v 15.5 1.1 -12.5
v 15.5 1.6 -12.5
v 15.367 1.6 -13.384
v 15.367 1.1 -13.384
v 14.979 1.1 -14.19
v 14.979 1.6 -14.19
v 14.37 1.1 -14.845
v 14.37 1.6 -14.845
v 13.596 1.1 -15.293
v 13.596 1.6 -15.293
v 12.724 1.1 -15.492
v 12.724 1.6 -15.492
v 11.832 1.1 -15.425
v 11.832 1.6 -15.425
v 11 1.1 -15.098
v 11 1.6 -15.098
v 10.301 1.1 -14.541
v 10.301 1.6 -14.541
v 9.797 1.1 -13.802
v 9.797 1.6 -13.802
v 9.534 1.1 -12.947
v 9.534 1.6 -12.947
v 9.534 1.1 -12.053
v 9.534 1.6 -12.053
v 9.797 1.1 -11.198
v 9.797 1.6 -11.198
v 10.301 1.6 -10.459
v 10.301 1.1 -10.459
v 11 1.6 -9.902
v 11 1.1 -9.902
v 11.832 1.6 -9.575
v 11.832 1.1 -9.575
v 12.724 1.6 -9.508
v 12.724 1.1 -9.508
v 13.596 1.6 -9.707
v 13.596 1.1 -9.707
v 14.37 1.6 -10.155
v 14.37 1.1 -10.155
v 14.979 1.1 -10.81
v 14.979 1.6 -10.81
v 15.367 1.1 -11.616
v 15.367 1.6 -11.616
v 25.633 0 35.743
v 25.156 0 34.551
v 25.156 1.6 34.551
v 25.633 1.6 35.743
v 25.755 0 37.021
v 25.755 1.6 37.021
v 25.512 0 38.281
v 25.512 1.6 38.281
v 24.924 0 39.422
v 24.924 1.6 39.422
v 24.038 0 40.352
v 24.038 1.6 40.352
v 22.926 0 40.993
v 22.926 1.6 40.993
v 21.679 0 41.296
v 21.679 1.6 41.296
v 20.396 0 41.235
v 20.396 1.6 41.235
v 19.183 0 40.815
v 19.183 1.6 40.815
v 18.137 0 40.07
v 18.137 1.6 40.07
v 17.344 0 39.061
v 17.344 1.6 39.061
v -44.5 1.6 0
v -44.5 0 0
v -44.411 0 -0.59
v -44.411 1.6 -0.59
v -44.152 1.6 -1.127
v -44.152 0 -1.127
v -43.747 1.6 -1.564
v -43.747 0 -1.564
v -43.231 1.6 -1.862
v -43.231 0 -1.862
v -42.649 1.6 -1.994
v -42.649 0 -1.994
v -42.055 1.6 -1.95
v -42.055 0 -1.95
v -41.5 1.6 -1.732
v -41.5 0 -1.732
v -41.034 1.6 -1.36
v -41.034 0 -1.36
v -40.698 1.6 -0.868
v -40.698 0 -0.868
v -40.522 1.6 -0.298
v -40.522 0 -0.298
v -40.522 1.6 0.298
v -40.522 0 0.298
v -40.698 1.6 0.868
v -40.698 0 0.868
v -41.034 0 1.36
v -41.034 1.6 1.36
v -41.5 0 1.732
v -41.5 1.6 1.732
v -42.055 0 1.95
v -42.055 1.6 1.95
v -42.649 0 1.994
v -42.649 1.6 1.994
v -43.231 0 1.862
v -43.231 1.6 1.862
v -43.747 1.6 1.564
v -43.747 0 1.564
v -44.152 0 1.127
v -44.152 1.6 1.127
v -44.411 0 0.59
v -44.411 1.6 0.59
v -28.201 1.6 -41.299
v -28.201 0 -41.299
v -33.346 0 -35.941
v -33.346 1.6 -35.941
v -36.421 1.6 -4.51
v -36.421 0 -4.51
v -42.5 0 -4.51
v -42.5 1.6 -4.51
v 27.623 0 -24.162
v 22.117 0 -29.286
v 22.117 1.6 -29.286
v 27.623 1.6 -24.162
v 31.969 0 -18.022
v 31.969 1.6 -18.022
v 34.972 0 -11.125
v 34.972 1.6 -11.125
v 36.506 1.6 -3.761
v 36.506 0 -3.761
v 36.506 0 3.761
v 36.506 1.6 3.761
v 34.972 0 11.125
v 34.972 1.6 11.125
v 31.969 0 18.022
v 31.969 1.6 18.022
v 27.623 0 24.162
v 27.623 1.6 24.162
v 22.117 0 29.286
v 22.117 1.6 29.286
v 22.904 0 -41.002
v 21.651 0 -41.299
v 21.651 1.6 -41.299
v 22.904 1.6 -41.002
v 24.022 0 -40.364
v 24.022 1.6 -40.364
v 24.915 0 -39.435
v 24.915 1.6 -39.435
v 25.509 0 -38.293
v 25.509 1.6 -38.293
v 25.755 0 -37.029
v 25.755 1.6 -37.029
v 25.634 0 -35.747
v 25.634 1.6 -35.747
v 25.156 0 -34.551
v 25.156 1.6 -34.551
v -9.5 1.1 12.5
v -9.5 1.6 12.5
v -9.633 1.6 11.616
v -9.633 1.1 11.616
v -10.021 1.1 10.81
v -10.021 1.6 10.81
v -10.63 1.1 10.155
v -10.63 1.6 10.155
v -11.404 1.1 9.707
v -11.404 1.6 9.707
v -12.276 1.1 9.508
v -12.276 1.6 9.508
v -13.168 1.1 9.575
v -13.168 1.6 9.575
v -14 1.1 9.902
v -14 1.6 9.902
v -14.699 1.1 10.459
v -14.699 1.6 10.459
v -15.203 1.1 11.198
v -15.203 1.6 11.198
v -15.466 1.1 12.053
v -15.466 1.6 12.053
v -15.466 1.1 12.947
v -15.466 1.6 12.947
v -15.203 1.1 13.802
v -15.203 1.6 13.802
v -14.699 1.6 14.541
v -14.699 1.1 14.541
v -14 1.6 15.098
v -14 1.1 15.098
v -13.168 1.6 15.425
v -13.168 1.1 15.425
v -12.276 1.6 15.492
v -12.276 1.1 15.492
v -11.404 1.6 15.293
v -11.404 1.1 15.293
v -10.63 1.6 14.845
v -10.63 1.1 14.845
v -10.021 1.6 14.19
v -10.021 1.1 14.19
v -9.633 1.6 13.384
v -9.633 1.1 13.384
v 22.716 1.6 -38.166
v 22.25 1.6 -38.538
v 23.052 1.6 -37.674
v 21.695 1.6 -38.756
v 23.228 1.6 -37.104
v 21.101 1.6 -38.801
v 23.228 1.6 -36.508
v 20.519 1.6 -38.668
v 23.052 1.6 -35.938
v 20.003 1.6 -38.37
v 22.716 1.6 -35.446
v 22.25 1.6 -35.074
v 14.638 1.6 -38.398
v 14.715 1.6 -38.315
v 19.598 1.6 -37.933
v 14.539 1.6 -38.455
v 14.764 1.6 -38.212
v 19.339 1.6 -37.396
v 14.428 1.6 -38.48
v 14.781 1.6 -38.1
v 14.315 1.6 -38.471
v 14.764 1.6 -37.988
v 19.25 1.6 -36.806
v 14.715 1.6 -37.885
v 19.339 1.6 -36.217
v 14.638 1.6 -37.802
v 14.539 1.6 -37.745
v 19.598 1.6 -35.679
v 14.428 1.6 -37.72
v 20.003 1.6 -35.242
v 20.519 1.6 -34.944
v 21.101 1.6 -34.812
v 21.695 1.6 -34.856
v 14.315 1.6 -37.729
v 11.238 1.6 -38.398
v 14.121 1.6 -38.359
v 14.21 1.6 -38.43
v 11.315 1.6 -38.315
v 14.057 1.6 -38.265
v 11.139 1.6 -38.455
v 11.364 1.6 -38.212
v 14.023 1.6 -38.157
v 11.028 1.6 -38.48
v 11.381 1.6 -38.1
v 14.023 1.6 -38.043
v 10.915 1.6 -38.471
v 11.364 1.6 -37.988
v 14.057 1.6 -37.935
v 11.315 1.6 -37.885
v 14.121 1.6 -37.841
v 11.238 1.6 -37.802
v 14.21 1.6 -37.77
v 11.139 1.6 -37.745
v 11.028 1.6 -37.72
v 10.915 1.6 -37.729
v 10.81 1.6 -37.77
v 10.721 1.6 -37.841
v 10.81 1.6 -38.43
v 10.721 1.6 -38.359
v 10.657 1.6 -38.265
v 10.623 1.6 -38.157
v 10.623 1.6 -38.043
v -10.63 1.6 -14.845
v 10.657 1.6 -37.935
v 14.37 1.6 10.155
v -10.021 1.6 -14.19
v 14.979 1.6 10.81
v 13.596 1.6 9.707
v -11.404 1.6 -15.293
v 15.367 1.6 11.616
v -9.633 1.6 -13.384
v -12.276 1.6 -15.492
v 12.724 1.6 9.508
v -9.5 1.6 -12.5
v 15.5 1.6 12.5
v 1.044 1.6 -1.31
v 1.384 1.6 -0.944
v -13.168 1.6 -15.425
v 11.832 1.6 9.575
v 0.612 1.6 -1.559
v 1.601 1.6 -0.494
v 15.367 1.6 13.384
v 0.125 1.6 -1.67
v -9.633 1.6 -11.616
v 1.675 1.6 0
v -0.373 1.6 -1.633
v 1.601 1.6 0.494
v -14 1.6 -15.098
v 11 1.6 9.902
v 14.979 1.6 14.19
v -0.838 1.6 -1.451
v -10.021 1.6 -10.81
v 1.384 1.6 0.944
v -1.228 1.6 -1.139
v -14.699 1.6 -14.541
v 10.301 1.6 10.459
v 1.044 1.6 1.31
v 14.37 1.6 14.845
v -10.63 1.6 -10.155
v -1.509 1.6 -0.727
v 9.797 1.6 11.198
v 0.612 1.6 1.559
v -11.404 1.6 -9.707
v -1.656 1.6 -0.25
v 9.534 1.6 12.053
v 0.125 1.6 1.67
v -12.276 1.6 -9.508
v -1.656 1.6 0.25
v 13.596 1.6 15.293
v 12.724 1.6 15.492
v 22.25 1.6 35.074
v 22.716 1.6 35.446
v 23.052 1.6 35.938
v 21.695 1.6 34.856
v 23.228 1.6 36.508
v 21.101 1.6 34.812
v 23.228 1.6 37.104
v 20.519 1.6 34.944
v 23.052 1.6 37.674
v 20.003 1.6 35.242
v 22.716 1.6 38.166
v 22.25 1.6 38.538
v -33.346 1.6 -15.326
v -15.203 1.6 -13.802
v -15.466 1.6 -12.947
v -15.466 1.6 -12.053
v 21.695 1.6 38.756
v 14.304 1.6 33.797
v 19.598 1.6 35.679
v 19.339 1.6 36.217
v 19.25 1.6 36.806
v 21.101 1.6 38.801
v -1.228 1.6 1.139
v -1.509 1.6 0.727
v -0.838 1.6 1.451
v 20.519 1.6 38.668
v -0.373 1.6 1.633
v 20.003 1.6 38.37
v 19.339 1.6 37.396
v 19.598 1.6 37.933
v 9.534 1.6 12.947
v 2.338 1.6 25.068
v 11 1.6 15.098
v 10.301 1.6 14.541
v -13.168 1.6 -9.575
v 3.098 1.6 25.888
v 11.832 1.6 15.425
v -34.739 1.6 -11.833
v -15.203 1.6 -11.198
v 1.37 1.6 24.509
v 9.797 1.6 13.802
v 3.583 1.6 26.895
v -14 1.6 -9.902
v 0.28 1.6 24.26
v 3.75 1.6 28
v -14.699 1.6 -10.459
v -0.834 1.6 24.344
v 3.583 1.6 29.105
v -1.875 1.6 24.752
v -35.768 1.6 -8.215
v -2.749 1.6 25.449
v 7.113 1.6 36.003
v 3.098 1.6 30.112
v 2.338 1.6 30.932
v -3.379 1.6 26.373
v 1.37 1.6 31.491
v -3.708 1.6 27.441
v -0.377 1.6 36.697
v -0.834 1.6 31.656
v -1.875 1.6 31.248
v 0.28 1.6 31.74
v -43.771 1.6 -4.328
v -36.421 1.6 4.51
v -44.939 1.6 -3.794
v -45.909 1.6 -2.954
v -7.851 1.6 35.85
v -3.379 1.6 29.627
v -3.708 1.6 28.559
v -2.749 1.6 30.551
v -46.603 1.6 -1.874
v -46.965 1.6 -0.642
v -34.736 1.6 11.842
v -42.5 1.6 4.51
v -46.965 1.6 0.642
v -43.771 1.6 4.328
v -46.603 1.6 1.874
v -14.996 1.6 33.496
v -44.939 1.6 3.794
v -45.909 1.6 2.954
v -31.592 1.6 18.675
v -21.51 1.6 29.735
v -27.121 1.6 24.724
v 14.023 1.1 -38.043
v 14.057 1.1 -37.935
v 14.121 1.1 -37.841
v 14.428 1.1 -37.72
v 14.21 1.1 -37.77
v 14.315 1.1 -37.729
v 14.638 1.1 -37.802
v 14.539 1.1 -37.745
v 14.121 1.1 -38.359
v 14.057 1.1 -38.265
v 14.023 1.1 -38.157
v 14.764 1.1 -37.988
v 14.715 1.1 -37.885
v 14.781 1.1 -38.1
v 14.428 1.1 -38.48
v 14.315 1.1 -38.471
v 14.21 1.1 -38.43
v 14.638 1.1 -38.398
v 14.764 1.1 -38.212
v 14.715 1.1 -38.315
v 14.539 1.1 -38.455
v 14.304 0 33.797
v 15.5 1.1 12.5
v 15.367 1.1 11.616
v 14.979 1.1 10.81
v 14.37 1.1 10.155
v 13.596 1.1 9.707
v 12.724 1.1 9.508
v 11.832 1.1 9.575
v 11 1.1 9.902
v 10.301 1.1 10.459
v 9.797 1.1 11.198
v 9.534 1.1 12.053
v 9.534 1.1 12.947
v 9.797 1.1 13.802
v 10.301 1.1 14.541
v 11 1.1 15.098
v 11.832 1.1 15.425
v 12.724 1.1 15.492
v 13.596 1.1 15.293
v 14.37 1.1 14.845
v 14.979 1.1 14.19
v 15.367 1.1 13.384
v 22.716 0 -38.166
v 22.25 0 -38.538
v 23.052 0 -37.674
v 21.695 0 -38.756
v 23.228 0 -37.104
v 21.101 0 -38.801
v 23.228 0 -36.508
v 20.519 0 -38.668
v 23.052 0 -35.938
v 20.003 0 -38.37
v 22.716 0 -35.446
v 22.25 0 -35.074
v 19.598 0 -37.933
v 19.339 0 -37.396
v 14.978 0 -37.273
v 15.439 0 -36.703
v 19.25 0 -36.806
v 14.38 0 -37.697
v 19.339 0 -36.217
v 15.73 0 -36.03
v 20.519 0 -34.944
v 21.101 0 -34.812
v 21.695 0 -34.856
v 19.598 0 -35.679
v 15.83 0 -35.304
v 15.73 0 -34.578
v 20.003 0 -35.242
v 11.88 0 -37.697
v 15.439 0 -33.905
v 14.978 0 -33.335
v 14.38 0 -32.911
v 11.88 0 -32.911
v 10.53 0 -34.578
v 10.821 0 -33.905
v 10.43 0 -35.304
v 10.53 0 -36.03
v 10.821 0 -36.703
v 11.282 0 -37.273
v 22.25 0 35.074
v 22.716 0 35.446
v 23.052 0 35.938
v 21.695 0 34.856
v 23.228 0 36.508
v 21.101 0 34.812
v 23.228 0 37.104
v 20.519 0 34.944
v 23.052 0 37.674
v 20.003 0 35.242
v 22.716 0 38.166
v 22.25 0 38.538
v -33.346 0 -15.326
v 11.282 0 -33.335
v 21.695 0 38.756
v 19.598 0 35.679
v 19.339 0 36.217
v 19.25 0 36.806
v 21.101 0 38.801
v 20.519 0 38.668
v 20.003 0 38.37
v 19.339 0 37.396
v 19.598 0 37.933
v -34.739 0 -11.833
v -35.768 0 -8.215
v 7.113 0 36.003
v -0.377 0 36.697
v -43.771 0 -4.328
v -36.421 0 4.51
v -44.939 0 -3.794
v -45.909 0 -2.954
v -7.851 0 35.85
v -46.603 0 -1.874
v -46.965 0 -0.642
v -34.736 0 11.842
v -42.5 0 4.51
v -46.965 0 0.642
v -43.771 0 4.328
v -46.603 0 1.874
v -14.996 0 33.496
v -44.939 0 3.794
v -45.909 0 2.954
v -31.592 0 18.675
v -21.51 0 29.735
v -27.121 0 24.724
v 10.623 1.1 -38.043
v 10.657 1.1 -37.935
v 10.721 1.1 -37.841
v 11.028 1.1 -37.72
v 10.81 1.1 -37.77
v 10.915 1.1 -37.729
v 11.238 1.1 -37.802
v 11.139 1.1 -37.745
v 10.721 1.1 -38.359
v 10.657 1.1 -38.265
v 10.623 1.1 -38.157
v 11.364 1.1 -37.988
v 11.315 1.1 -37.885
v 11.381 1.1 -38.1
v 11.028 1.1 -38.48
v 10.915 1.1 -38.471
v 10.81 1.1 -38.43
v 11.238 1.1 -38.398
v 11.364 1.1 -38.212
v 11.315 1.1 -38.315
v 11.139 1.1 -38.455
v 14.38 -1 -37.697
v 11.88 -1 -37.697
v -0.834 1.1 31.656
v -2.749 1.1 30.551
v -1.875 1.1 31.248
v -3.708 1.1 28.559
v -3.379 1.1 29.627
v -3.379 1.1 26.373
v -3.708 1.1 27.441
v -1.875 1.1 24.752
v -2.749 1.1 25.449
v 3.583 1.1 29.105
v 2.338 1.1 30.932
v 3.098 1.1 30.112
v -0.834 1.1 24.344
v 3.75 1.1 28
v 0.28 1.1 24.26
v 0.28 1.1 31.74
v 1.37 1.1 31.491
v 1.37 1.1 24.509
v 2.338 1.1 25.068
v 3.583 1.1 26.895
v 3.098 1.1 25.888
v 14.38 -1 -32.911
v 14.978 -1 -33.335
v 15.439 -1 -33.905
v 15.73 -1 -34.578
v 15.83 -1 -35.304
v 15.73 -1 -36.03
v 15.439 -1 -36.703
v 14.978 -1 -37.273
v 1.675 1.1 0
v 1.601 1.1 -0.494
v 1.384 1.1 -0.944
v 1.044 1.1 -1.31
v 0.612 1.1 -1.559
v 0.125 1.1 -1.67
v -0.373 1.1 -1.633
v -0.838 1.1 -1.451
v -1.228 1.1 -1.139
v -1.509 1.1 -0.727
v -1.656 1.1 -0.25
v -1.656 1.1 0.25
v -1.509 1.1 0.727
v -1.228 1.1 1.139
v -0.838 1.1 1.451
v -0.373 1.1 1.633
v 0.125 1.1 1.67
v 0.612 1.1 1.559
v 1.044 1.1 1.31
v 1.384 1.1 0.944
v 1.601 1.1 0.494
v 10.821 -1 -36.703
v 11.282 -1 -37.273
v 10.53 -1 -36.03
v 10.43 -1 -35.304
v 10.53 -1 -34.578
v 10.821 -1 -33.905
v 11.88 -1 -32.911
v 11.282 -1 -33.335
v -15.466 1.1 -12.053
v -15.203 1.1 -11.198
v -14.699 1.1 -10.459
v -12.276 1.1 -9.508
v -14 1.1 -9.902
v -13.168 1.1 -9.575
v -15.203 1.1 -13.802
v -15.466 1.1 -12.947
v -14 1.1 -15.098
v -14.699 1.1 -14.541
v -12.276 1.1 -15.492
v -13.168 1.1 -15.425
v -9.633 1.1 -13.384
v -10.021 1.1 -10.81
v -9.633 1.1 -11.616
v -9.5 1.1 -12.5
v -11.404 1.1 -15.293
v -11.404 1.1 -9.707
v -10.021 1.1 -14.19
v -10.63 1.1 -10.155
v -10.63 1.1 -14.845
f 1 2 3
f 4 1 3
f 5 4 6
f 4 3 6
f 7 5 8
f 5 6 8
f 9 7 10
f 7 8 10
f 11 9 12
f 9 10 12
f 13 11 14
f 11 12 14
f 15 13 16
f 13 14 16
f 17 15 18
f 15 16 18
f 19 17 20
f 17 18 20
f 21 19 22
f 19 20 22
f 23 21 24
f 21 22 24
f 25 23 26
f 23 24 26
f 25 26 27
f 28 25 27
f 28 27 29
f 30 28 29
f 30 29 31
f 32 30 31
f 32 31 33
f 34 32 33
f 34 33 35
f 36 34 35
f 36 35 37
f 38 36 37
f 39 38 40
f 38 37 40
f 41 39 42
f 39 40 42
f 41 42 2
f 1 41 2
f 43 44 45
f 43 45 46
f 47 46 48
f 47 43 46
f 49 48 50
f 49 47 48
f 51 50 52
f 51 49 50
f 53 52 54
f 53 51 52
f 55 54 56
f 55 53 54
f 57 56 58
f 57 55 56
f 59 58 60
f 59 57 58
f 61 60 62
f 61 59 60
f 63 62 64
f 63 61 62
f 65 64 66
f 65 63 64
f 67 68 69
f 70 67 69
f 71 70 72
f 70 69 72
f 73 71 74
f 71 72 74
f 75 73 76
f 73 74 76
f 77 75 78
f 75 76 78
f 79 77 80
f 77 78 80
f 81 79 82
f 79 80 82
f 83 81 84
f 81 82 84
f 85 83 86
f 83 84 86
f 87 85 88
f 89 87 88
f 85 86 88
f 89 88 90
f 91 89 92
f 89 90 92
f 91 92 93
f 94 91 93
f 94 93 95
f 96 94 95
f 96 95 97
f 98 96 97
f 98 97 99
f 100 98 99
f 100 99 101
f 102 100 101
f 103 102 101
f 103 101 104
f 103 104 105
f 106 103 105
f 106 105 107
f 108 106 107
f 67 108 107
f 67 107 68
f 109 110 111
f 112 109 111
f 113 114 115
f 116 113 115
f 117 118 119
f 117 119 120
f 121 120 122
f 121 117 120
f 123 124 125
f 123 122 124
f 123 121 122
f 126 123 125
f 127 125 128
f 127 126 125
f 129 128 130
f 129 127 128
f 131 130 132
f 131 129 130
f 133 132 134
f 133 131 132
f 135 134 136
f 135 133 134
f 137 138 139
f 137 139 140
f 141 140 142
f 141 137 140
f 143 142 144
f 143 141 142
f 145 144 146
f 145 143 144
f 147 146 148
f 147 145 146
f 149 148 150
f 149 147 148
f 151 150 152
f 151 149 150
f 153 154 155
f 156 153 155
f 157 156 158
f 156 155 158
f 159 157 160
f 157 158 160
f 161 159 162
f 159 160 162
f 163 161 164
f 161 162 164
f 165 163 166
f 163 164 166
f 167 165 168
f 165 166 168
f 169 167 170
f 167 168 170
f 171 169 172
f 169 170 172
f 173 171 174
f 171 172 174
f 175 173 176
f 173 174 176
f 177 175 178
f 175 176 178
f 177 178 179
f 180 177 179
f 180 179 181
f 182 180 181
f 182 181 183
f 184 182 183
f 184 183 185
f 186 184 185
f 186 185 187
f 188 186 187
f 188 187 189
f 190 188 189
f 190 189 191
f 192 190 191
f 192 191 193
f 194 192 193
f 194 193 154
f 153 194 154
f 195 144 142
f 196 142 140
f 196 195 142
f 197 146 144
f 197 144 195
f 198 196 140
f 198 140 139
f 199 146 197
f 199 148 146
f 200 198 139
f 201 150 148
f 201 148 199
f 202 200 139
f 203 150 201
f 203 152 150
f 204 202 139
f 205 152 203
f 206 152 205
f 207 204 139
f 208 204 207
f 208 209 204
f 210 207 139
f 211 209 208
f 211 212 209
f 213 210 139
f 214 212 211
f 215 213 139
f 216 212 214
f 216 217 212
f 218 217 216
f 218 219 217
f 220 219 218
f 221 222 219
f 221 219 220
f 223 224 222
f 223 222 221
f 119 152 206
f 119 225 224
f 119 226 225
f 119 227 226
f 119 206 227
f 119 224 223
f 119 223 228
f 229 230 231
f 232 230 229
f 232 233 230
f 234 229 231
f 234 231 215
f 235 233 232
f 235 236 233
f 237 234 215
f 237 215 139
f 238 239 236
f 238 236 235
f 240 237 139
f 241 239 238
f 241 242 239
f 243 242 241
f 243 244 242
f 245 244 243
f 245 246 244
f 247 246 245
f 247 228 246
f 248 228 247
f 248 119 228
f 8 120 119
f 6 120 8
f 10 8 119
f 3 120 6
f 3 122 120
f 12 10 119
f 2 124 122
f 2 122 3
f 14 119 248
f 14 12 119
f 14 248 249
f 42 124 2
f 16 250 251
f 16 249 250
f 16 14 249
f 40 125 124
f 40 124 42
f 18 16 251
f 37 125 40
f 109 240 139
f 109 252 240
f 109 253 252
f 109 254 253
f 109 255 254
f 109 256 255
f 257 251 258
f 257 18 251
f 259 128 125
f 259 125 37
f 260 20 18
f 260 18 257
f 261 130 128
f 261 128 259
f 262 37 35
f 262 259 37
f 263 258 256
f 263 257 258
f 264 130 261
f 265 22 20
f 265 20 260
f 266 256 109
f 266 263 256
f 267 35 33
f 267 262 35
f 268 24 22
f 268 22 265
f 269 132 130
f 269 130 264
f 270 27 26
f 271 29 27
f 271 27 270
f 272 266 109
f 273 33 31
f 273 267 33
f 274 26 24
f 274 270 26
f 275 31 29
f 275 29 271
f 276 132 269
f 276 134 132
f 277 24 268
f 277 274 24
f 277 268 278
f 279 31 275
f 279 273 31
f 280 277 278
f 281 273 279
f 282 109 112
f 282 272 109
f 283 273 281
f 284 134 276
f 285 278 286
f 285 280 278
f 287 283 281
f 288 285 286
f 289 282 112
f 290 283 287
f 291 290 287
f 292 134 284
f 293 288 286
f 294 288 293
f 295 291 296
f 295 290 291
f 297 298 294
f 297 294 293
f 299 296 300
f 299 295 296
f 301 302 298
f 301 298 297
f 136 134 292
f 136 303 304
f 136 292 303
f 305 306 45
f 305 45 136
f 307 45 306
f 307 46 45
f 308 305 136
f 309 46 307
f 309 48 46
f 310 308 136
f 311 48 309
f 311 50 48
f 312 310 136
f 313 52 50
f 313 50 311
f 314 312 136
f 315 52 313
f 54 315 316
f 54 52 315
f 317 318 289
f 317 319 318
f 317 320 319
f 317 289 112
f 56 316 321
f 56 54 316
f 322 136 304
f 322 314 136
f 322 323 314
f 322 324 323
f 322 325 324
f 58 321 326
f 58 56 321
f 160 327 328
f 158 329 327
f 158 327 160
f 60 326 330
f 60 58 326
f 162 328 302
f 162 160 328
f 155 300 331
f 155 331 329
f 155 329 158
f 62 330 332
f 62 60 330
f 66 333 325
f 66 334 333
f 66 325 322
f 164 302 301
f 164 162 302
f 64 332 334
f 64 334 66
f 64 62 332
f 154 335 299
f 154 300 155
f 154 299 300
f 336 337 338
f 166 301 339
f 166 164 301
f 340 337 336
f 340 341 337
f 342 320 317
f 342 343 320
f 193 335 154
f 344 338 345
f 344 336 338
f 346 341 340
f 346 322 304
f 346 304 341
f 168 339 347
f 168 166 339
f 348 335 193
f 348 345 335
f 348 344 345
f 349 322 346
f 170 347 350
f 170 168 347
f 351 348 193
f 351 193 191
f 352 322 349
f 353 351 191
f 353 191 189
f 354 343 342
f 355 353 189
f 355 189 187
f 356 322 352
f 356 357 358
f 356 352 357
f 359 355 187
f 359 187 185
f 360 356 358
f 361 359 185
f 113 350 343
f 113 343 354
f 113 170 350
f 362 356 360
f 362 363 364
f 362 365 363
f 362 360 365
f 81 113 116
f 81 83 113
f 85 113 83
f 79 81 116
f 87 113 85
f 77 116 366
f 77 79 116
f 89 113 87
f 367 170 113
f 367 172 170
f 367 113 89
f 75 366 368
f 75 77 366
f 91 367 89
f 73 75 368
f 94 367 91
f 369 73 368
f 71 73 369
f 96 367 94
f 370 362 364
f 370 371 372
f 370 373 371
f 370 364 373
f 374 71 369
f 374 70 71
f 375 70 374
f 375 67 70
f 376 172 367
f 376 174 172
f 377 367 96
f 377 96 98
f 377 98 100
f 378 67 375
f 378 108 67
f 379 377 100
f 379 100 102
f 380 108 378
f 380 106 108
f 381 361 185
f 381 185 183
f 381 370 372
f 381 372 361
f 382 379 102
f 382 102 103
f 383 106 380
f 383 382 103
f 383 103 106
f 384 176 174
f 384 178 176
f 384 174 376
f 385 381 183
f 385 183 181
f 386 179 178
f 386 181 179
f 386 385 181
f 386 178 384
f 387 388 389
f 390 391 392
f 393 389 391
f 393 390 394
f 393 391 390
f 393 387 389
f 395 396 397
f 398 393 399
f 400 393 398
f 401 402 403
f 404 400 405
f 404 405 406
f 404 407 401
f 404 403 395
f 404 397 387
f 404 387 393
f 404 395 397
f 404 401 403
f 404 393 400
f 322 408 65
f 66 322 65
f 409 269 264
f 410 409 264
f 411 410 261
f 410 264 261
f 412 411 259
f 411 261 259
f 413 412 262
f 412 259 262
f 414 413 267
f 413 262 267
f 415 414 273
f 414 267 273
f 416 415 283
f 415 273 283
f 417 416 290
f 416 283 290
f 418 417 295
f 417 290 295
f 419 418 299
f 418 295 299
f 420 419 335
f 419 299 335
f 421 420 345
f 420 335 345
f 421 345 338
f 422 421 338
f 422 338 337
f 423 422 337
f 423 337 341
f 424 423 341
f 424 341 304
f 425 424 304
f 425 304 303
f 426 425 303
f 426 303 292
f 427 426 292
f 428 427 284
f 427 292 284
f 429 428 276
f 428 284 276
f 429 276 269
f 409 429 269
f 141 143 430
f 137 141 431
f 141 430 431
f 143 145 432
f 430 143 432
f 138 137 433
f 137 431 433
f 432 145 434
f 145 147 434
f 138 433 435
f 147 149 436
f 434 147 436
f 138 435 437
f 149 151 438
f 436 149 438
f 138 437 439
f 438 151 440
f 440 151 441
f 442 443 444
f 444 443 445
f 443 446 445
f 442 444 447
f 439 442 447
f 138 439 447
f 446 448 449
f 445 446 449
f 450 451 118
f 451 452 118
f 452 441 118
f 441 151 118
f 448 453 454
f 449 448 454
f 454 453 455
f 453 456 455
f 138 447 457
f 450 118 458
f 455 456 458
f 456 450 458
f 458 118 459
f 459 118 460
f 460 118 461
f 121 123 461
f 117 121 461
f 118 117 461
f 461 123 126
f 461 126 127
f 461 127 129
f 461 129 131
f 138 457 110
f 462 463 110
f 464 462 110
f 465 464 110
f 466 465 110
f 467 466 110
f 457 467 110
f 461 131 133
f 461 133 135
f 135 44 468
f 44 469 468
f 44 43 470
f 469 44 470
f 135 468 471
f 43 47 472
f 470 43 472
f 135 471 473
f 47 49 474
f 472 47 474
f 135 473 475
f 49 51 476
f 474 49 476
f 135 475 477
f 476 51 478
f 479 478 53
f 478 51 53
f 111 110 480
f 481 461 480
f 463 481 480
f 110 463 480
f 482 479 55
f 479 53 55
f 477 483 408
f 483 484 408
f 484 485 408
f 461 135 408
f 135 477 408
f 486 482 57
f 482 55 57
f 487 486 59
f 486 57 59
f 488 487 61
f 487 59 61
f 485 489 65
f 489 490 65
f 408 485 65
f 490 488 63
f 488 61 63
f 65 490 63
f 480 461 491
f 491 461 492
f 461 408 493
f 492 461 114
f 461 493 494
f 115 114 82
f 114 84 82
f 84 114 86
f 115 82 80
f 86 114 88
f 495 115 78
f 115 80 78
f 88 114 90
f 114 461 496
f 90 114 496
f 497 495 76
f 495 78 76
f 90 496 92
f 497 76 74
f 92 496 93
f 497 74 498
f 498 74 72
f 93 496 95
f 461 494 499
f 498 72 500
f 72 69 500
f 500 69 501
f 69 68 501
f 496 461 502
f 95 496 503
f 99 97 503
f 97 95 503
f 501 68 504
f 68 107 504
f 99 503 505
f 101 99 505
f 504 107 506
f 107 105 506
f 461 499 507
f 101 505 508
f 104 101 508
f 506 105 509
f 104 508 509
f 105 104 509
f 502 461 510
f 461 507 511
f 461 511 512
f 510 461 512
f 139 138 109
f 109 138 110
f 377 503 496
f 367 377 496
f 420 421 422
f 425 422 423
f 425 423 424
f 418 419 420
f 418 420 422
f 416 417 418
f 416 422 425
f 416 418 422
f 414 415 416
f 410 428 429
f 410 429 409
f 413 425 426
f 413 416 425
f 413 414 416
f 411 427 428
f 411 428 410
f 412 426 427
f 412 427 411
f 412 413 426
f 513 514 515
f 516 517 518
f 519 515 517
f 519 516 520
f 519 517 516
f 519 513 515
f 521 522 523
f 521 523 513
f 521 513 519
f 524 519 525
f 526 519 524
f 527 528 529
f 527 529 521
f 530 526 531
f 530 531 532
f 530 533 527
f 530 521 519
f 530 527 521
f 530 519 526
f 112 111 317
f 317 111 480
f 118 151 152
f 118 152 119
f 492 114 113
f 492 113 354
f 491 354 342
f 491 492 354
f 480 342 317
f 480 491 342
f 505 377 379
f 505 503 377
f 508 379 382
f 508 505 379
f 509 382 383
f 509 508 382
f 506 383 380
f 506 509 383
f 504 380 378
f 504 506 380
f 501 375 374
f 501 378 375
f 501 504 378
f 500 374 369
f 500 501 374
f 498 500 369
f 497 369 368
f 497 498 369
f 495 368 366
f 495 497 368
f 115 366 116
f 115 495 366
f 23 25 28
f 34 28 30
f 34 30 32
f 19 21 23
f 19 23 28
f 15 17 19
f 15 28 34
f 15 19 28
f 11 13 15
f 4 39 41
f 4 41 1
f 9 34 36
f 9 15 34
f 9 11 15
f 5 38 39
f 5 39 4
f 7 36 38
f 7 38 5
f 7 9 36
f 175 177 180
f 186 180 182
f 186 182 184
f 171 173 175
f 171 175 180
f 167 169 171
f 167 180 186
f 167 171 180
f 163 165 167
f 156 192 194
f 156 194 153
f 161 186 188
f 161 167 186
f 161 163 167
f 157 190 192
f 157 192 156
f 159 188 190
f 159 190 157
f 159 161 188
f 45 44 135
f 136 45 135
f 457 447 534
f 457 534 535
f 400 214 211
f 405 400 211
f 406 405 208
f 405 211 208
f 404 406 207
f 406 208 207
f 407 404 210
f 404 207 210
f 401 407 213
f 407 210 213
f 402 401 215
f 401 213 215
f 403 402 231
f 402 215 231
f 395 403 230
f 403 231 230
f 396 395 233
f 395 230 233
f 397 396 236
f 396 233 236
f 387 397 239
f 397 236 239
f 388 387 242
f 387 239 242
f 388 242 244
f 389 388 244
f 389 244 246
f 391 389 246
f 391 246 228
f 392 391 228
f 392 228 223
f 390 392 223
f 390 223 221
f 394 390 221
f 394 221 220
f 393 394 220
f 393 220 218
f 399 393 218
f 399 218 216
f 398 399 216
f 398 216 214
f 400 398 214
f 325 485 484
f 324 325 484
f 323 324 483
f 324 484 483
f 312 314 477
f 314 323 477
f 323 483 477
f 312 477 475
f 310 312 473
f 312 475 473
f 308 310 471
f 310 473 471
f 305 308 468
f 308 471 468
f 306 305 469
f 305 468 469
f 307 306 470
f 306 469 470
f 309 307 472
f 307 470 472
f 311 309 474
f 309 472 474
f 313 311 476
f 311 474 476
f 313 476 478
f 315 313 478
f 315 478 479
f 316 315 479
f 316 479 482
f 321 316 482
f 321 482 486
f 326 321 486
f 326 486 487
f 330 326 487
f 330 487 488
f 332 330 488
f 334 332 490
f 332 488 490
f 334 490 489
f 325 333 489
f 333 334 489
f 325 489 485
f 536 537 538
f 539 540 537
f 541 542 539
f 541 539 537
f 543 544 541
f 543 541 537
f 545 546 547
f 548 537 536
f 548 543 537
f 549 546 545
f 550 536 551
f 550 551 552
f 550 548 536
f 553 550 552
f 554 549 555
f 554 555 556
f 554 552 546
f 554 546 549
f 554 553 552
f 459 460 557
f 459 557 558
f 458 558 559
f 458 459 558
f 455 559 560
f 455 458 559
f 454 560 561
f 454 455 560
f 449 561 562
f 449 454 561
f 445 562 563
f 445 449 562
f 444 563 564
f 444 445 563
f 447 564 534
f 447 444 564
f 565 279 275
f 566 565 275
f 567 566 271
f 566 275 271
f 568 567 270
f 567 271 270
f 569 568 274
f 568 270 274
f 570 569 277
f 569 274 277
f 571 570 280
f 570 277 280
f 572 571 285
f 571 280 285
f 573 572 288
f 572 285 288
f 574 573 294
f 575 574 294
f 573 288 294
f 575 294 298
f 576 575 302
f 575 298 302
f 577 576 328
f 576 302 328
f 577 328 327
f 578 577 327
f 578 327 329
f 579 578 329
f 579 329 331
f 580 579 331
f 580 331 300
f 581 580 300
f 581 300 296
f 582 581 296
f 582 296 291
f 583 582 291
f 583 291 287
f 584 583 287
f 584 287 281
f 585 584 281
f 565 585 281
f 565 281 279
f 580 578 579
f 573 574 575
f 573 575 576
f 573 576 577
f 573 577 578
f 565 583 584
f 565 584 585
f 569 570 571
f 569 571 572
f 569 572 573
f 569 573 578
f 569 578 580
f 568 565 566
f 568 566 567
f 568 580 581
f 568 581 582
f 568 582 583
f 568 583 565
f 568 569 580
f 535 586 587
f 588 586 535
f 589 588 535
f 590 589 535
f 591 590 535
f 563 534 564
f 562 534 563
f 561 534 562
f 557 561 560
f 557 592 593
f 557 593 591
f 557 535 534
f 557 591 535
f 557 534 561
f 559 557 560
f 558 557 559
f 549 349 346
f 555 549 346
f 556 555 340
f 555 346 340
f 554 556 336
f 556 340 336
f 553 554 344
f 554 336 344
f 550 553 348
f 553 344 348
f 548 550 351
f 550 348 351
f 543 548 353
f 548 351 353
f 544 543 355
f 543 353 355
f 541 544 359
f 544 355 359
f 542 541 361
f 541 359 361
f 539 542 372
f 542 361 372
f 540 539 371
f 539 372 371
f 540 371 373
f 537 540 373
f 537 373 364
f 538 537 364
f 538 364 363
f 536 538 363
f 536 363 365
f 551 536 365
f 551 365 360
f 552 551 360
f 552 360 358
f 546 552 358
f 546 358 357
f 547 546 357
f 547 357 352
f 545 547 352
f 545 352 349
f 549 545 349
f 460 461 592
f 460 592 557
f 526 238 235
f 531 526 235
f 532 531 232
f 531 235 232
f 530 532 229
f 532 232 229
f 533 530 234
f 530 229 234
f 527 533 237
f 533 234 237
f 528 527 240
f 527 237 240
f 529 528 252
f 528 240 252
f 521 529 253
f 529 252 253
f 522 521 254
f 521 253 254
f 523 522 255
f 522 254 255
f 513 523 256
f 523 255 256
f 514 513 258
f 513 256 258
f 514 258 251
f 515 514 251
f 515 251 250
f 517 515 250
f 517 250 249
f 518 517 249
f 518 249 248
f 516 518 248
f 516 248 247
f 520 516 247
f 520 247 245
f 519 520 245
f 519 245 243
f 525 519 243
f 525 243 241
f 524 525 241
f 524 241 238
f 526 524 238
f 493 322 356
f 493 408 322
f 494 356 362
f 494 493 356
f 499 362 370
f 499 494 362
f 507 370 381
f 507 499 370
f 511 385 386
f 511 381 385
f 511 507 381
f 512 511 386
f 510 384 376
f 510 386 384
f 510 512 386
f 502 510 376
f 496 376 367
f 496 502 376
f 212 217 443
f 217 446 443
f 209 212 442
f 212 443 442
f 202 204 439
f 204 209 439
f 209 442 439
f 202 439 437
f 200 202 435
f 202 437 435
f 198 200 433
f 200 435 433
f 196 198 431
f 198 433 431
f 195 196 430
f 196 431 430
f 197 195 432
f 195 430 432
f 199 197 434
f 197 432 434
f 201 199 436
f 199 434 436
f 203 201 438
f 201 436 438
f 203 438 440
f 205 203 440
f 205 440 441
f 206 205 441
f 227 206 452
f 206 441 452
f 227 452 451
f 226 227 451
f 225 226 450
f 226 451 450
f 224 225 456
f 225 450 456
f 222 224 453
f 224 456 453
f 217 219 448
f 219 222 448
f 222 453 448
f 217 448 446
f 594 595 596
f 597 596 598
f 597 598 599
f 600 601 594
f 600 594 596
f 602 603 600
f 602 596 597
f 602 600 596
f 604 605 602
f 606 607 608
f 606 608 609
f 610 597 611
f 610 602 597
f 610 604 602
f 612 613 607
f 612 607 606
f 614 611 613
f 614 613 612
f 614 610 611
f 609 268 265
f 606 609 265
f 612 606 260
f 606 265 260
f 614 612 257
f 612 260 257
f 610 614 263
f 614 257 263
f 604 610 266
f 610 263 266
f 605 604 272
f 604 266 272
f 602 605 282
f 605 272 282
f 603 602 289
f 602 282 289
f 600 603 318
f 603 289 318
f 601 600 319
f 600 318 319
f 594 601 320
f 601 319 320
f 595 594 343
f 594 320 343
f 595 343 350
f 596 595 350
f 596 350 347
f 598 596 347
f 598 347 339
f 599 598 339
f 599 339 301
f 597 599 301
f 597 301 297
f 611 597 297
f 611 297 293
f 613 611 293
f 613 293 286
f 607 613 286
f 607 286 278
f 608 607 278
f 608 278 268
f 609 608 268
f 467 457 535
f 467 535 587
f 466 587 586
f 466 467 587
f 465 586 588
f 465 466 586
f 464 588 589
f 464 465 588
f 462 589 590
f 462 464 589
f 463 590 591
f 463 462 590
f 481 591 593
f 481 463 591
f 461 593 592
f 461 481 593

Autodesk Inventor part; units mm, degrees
ref_plane "YZ Plane" through (0, 0, 0) normal (1, 0, 0) x (0, 1, 0)
ref_plane "XZ Plane" through (0, 0, 0) normal (0, 1, 0) x (-1, 0, 0)
ref_plane "XY Plane" through (0, 0, 0) normal (0, 0, 1) x (1, 0, 0)
sketch "Sketch1" plane through (0, 0, 0) normal (0, 1, 0) x (-1, 0, 0)
  circle A0 centre (42.5, 0) radius 2
  circle A1 centre (-21.25, 36.8061) radius 2
  circle A2 centre (-21.25, -36.8061) radius 2
  line L0 (-21.25, -36.8061) -> (0, 0) construction
  arc A3 (-25.1562, -34.5508) -> (-20.8492, -41.2987) centre (-21.25, -36.8061) ccw
  line L1 (-21.25, 36.8061) -> (0, 0) construction
  arc A4 (-17.3438, 39.0613) -> (-25.1562, 34.5508) centre (-21.25, 36.8061) ccw
  line L2 (0, 0) -> (42.5, 0) construction
  arc A5 (42.5, -4.5105) -> (42.5, 4.5105) centre (42.5, 0) ccw
  line L3 (-21.6508, -41.2987) -> (28.2014, -41.2987)
  line L4 (28.2014, -41.2987) -> (33.3458, -35.9407)
  line L5 (33.3458, -35.9407) -> (33.3458, -15.3261)
  line L6 (-25.1562, -34.5508) -> (-22.1167, -29.2863)
  line L7 (36.421, -4.5105) -> (42.5, -4.5105)
  line L8 (42.5, 0) -> (36.6992, 0)
  line L9 (4.5105, 0) -> (0, 0)
  line L10 (42.5, 4.5105) -> (36.421, 4.5105)
  line L11 (-25.1562, 34.5508) -> (-22.1167, 29.2863)
  line L12 (-14.3043, 33.7968) -> (-17.3438, 39.0613)
  arc A6 (-22.1167, 29.2863) -> (-22.1167, -29.2863) centre (0, 0) ccw
  arc A7 (33.3458, -15.3261) -> (36.421, -4.5105) centre (0, 0) ccw
  arc A8 (36.421, 4.5105) -> (-14.3043, 33.7968) centre (0, 0) ccw
  point P0 (-10.625, -18.403)
  point P1 (-10.625, 18.403)
  point P2 (21.25, 0)
  dimension "d1" = 4
  dimension "d2" = 42.5
  dimension "d5" = 360
extrude "Extrusion1" add sketch "Sketch1" along normal blind 1.6 contours L6 A6 L11 A4 L12 A8 L10 A5 L7 A7 L5 L4 L3 A3
sketch "Sketch2" plane through (0, 1.6, 0) normal (0, 1, 0) x (1, 0, 0)
  line L0 (35, 0) -> (0, 0) construction
  circle A0 centre (12.5, 12.5) radius 3
  circle A1 centre (-12.5, 12.5) radius 3
  circle A2 centre (-12.5, -12.5) radius 3
  circle A3 centre (12.5, -12.5) radius 3
  line L1 (1.675, -1.675) -> (-1.675, -1.675)
  line L2 (-1.675, -1.675) -> (-1.675, 1.675)
  line L3 (-1.675, 1.675) -> (1.675, 1.675)
  line L4 (1.675, 1.675) -> (1.675, -1.675)
  line L5 (1.675, -1.675) -> (-1.675, 1.675) construction
  line L6 (-1.675, -1.675) -> (1.675, 1.675) construction
  circle A4 centre (0, 0) radius 1.675
  circle A5 centre (0, -28) radius 3.75
  line L7 (0, -28) -> (0, 0) construction
  line L8 (-42.5, -4.5105) -> (-36.421, -4.5105) projected
  arc A6 (-42.5, 4.5105) -> (-42.5, -4.5105) centre (-42.5, 0) ccw projected
  line L9 (-36.421, 4.5105) -> (-42.5, 4.5105) projected
  arc A7 (-33.3458, 15.3261) -> (-36.421, 4.5105) centre (0, 0) ccw projected
  line L10 (-33.3458, 35.9407) -> (-33.3458, 15.3261) projected
  line L11 (-28.2014, 41.2987) -> (-33.3458, 35.9407) projected
  line L12 (21.6508, 41.2987) -> (-28.2014, 41.2987) projected
  arc A8 (25.1562, 34.5508) -> (21.6508, 41.2987) centre (21.25, 36.8061) ccw projected
  line L13 (22.1167, 29.2863) -> (25.1562, 34.5508) projected
  arc A9 (22.1167, -29.2863) -> (22.1167, 29.2863) centre (0, 0) ccw projected
  line L14 (25.1562, -34.5508) -> (22.1167, -29.2863) projected
  arc A10 (17.3438, -39.0613) -> (25.1562, -34.5508) centre (21.25, -36.8061) ccw projected
  line L15 (14.3043, -33.7968) -> (17.3438, -39.0613) projected
  arc A11 (-36.421, -4.5105) -> (14.3043, -33.7968) centre (0, 0) ccw projected
  circle A12 centre (21.25, 36.8061) radius 2 projected
  circle A13 centre (21.25, -36.8061) radius 2 projected
  circle A14 centre (-42.5, 0) radius 2 projected
  circle A15 centre (11, 38.1) radius 0.381
  circle A16 centre (14.4, 38.1) radius 0.381
  line L16 (11, 38.1) -> (14.4, 38.1) construction
  dimension "d23" = 35
  dimension "d24" = 360
  dimension "d25" = 12.5
  dimension "d26" = 12.5
  dimension "d27" = 6
  dimension "d28" = 360
  dimension "d31" = 3.35
  dimension "d32" = 28
  dimension "d33" = 7.5
  dimension "d34" = 11
  dimension "d36" = 38.1
  dimension "d37" = 3.4
  dimension "d38" = 0.762
extrude "Extrusion2" cut sketch "Sketch2" against normal blind 0.5 contours A0 | A1 | A2 | A3 | A4 | A5 | A15 | A16
sketch "Sketch3" plane through (0, 0, 0) normal (0, -1, 0) x (1, 0, 0)
  line L0 (14.38, -37.6973) -> (11.88, -37.6973)
  line L1 (21.6508, -41.2987) -> (-28.2014, -41.2987) construction
  line L2 (11.88, -32.9109) -> (14.38, -32.9109)
  arc A0 (14.38, -37.6973) -> (14.38, -32.9109) centre (13.13, -35.3041) ccw
  arc A1 (11.88, -32.9109) -> (11.88, -37.6973) centre (13.13, -35.3041) ccw
  line L3 (11.88, -37.6973) -> (14.38, -32.9109) construction
  line L4 (14.38, -37.6973) -> (11.88, -32.9109) construction
  line L5 (14.4, -35.3041) -> (11.86, -35.3041) construction
  circle A2 centre (14.4, -35.3041) radius 0.381
  circle A3 centre (11.86, -35.3041) radius 0.381
  circle A4 centre (21.25, -36.8061) radius 2 construction
  point P0 (0, 0)
  dimension "d39" = 2.7
  dimension "d40" = 2.5
  dimension "d41" = 0.762
  dimension "d42" = 2.54
  dimension "d43" = 6.85
  dimension "d44" = 1.502
extrude "Extrusion3" add sketch "Sketch3" along normal blind 1 contours L0 A1 L2 A0 | A2 | A3
equation "\"d26\" = d25"
properties part number "PCB"
